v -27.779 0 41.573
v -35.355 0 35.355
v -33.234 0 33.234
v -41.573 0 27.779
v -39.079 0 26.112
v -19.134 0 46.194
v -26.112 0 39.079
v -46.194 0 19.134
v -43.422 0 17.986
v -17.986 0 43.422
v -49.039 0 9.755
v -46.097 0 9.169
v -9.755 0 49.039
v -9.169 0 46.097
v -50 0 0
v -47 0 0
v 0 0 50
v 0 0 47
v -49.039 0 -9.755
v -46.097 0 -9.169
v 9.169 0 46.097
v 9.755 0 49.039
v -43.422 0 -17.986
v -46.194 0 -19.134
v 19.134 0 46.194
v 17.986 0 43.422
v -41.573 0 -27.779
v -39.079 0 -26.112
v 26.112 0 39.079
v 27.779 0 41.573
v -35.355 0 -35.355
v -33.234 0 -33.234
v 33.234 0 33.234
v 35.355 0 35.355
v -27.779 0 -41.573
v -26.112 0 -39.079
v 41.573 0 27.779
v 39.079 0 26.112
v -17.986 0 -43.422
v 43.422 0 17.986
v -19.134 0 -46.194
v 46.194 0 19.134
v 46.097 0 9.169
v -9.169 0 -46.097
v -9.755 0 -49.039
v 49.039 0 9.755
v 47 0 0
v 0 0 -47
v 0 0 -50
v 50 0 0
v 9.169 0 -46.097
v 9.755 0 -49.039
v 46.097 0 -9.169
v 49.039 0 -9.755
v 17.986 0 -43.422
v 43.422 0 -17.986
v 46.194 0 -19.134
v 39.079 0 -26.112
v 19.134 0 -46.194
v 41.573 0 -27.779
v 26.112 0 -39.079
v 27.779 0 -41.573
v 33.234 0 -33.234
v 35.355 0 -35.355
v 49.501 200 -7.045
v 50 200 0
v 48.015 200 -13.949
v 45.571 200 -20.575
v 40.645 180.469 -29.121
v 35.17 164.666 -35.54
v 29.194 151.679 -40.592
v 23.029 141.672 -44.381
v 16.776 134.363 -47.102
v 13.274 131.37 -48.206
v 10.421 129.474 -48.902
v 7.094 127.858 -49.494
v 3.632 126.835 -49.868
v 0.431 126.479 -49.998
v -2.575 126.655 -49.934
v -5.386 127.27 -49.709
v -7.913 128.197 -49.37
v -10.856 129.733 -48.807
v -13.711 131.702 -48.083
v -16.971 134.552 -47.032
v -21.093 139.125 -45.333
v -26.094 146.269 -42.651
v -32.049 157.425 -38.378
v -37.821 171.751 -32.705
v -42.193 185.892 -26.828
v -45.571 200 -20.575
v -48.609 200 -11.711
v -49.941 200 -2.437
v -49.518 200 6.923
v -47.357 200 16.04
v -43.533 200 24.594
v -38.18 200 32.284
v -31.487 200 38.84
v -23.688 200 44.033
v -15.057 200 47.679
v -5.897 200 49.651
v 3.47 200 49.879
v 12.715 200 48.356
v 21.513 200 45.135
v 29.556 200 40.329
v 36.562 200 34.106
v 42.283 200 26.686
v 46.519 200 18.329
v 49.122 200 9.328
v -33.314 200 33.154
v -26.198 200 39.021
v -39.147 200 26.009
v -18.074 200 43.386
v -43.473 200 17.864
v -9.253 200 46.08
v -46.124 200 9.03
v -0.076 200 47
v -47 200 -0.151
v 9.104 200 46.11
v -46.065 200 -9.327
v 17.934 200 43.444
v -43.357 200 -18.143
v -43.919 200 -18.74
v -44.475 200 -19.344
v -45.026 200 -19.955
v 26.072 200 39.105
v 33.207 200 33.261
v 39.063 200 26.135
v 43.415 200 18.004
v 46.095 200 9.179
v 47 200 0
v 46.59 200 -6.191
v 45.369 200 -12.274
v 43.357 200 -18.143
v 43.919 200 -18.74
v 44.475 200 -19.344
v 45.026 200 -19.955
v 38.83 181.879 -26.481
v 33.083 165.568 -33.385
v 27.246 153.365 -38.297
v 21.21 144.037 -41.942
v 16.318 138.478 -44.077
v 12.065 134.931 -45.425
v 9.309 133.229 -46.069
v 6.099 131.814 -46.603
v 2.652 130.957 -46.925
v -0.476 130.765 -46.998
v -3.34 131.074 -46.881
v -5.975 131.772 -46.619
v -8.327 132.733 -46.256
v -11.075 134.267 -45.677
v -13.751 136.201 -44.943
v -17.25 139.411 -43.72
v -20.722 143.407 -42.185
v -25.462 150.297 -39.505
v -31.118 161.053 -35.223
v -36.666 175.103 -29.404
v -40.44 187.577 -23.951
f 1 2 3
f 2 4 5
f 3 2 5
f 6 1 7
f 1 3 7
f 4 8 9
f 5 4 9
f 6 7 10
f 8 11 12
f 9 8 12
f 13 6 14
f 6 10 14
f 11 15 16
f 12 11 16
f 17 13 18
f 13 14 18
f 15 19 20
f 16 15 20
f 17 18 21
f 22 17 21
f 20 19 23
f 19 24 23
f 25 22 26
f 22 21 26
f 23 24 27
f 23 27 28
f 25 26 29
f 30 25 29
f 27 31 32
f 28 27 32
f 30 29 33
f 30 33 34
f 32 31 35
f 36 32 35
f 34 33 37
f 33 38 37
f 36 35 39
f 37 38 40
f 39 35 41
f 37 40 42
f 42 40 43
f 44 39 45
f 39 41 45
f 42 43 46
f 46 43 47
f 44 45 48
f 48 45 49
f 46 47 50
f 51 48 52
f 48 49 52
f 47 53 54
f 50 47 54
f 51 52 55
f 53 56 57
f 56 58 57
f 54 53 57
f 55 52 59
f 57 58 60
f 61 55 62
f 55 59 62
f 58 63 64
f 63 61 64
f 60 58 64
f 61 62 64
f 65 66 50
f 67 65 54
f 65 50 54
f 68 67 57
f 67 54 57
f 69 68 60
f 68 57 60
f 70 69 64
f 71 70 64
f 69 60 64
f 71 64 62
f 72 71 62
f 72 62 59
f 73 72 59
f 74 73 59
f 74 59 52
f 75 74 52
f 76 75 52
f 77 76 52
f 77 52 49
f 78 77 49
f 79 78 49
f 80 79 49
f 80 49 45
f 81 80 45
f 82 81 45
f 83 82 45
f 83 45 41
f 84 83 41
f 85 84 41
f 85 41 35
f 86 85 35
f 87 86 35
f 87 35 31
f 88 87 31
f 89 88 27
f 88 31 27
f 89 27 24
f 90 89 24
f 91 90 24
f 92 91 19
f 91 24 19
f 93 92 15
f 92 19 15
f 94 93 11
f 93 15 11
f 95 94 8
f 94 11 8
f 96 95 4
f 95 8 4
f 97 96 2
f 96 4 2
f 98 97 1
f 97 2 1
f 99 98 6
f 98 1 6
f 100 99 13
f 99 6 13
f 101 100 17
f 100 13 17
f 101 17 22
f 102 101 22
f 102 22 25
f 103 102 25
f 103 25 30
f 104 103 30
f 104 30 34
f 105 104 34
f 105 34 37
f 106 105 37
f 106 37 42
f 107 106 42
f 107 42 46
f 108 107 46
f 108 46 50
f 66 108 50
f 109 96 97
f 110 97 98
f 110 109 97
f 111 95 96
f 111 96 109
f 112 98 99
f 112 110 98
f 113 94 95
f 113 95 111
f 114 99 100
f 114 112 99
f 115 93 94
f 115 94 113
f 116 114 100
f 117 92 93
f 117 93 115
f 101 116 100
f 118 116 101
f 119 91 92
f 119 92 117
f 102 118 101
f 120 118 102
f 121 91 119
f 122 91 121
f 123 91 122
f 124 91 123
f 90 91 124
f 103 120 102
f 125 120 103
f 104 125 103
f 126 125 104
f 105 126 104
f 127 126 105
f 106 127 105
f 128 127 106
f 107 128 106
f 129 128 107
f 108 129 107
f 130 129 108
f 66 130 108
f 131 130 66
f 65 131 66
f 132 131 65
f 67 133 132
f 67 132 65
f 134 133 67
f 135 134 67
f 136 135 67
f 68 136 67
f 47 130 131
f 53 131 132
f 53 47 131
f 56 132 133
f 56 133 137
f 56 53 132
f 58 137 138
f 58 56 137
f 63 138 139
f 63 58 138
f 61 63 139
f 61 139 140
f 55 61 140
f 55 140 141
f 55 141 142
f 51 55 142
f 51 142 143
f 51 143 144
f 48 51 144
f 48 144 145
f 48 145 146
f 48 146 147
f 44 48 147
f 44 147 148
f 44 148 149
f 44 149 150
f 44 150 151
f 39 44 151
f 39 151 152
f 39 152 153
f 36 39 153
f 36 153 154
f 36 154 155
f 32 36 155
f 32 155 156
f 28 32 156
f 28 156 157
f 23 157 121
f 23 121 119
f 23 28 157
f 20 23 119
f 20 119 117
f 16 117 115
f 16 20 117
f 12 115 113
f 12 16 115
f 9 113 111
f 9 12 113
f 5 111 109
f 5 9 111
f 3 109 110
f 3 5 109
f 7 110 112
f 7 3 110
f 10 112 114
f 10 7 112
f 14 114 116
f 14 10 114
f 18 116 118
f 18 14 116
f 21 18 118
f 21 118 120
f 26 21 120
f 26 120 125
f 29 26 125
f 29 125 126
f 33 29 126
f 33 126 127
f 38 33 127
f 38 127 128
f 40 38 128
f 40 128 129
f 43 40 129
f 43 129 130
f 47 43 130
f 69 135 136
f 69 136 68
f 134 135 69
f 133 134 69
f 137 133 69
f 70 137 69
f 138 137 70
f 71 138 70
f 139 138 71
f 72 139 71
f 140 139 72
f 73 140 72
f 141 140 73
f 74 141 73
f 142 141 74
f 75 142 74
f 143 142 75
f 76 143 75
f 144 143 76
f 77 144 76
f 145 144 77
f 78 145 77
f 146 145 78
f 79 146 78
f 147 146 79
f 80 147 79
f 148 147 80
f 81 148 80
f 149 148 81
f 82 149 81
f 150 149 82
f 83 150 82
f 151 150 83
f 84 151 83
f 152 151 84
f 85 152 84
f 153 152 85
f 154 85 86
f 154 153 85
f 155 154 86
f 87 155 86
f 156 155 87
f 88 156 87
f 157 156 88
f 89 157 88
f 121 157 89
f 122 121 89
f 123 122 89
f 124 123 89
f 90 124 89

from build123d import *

# Parameters (mm, degrees)
EXTRUDE_1_OUTLINE_R      = 50
EXTRUDE_1_OUTLINE_R_2    = 47
EXTRUDE_1_DEPTH          = 200
CUT_EXTRUDE_1_DEPTH      = 213.132034356
CUT_EXTRUDE_1_DEPTH_BACK = 213.132034356
SKETCH_2_R               = 66.5


# Read off the part's stored shape, not the designer's step: Вытянуть-Тонкостенный1
with BuildPart() as part:
    # Вытянуть-Тонкостенный1 outline → Вытянуть-Тонкостенный1 (new body)
    with BuildSketch(Plane(origin=(0, 0, 0), x_dir=(1, 0, 0), z_dir=(0, 1, 0))):
        Circle(EXTRUDE_1_OUTLINE_R)
        Circle(EXTRUDE_1_OUTLINE_R_2, mode=Mode.SUBTRACT)
    extrude(amount=EXTRUDE_1_DEPTH)

    # Эскиз2 → Вырез-Вытянуть1 (cut, two sides: drawn at the far end of the back side and taken through both)
    with BuildSketch(Plane(origin=(0, 0, 0), x_dir=(1, 0, 0), z_dir=(0, -0.819152044288991, -0.5735764363510473)).offset(-CUT_EXTRUDE_1_DEPTH_BACK)):
        with Locations((0, -180)):
            Circle(SKETCH_2_R)
    extrude(amount=CUT_EXTRUDE_1_DEPTH + CUT_EXTRUDE_1_DEPTH_BACK, mode=Mode.SUBTRACT)


solid = part.part
